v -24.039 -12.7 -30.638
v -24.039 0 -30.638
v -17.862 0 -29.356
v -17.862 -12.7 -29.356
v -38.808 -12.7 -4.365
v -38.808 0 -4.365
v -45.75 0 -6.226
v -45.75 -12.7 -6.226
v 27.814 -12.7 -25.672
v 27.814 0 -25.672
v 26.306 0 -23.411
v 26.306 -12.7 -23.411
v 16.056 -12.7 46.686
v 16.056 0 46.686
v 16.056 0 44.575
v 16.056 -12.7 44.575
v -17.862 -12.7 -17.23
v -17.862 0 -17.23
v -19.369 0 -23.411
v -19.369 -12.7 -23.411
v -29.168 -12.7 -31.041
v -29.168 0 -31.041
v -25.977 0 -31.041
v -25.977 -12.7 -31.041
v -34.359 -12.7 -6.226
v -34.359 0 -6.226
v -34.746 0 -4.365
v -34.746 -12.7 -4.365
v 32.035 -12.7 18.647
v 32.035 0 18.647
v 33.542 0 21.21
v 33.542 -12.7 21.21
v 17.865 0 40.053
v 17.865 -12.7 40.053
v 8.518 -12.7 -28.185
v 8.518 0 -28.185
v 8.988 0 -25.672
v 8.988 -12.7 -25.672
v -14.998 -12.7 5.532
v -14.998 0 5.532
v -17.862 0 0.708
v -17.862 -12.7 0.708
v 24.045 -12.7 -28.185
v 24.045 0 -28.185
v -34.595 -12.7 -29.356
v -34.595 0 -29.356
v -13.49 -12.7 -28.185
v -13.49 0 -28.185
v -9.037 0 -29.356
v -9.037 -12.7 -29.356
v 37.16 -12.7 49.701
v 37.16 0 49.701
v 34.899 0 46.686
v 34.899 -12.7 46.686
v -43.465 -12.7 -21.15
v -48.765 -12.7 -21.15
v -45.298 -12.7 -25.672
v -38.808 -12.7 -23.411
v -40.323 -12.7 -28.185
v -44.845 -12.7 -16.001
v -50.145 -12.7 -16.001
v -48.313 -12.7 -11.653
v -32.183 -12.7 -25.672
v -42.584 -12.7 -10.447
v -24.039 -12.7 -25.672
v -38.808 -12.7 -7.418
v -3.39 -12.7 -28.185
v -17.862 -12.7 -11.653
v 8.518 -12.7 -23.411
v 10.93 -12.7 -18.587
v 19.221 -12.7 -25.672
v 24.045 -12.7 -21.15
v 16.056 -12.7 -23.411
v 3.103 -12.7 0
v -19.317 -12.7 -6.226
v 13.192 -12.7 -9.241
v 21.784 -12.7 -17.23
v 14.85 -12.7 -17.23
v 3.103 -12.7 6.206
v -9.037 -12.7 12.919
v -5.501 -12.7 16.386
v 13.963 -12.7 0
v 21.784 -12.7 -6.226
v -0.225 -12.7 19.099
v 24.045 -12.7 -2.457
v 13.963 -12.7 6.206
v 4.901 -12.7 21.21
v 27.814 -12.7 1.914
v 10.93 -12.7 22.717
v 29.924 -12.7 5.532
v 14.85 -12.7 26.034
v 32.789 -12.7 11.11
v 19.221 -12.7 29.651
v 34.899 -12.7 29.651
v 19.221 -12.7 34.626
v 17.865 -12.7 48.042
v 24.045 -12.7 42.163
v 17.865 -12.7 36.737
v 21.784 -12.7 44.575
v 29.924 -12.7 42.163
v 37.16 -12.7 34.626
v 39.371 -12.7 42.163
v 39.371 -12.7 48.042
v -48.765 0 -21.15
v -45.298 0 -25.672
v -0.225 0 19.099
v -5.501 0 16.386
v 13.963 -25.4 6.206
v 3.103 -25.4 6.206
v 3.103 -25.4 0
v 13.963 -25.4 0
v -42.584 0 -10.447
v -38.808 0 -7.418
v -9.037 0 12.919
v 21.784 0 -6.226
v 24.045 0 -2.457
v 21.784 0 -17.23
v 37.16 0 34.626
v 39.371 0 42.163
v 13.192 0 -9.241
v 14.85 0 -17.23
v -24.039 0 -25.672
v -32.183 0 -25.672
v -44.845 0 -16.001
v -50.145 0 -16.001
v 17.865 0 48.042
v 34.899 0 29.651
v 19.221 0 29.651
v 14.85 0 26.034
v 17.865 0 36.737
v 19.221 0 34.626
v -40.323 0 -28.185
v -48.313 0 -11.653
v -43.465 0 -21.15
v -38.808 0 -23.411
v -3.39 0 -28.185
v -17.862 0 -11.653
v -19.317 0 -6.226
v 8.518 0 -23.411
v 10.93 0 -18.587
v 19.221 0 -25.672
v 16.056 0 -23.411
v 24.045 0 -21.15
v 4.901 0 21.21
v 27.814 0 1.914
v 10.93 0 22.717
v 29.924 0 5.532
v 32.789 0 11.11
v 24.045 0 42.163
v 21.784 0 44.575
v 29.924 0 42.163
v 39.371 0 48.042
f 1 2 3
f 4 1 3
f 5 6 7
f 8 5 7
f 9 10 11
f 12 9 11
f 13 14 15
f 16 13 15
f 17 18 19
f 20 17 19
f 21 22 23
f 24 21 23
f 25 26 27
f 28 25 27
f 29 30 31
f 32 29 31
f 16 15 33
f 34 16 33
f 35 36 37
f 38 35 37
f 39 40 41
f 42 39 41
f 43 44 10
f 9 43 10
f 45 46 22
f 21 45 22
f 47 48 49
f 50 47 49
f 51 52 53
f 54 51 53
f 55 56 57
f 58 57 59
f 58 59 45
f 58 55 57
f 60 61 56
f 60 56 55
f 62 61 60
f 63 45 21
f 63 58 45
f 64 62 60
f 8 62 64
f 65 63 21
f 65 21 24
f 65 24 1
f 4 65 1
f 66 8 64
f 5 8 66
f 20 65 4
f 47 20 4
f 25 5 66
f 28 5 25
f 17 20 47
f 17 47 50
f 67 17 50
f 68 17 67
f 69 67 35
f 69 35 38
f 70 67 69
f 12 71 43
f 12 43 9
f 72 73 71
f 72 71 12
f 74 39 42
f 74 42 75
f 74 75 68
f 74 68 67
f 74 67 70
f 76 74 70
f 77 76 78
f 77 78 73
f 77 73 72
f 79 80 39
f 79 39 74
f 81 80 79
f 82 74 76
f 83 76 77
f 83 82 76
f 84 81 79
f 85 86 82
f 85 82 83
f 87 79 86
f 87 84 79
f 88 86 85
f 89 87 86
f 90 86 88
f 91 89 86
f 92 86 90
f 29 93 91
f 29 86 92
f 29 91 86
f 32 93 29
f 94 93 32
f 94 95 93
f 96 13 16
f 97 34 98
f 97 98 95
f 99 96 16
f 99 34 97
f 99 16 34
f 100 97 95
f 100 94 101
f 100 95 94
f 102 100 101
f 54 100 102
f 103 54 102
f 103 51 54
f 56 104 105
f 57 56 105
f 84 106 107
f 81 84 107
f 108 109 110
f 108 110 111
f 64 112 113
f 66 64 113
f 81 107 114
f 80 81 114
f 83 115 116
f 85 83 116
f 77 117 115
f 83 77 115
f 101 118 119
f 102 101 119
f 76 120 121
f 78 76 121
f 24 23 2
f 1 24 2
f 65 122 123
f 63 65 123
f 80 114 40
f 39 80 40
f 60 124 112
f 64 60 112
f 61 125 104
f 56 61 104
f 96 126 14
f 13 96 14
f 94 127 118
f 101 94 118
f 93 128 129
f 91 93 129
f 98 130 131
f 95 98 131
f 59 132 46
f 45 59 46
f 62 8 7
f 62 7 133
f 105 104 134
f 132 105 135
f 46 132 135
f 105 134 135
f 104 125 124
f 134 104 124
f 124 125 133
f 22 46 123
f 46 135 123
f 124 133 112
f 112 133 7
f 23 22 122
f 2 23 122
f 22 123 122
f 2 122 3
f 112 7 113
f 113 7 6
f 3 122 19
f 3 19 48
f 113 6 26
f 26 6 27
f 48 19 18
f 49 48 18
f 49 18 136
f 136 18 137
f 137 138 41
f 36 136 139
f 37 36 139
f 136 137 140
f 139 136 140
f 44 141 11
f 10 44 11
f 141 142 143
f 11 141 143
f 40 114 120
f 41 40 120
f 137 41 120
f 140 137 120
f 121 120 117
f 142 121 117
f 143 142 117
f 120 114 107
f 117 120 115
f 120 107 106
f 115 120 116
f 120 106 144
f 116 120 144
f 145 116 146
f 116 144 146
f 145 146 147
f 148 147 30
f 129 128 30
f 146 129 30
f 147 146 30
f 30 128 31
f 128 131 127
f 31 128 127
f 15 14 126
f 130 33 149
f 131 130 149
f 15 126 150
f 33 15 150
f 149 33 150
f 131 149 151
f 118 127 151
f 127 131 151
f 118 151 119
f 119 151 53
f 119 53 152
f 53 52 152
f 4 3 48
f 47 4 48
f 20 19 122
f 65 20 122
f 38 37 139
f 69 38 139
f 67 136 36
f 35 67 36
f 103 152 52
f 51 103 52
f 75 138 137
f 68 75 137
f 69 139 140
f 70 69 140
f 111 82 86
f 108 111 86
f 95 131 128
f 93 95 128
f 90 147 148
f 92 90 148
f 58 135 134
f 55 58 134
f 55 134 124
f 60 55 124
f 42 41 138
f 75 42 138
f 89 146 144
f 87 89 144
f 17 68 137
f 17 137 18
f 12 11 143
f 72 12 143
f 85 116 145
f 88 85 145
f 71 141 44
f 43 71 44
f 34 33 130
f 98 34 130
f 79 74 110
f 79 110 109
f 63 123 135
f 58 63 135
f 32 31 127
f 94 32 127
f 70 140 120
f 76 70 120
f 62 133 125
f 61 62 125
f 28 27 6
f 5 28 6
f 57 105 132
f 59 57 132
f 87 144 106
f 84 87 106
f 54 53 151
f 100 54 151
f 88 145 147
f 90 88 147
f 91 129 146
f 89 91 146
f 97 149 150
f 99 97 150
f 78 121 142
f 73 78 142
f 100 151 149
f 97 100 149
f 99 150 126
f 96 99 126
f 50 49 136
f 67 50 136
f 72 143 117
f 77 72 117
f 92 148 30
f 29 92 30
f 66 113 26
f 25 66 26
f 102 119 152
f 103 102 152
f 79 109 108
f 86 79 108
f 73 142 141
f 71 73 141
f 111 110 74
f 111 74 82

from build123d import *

# Parameters (mm, degrees)
F1_DEPTH = 12.7
F2_W     = 10.860083
F2_H     = 6.205762
F3_DEPTH = 12.7


with BuildPart() as f1:
    # F0 (on Front) → F1 (new body)
    with BuildSketch(Plane.XZ):
        Polygon((10.930421, 22.717176), (4.900595, 21.209723), (-0.224752, 19.099282), (-5.500847, 16.385859), (-9.036702, 12.918709), (-14.997827, 5.532174), (-17.861986, 0.708314), (-19.316724, -6.225982), (-17.861986, -11.652825), (-17.861986, -17.230413), (-19.369447, -23.410983), (-24.038606, -25.672167), (-32.182822, -25.672167), (-38.807783, -23.410983), (-43.465309, -21.149799), (-44.845456, -16.001211), (-42.584272, -10.446859), (-38.807783, -7.418466), (-34.359269, -6.225982), (-34.745501, -4.365046), (-38.807783, -4.365046), (-45.749934, -6.225982), (-48.312606, -11.652825), (-50.144989, -16.001211), (-48.764841, -21.149799), (-45.297699, -25.672167), (-40.323088, -28.184597), (-34.594753, -29.356468), (-29.167914, -31.04079), (-25.977362, -31.04079), (-24.038606, -30.638407), (-17.861986, -29.356468), (-13.490366, -28.184597), (-9.036702, -29.356468), (-3.390411, -28.184597), (1.584193, -28.184597), (8.518493, -28.184597), (8.987795, -25.672167), (8.518493, -23.410983), (10.930421, -18.587123), (13.191605, -9.240893), (14.849806, -17.230413), (16.055772, -23.410983), (19.221431, -25.672167), (24.045291, -28.184597), (27.813932, -25.672167), (26.306475, -23.410983), (24.045291, -21.149799), (21.784107, -17.230413), (21.784107, -12.105062), (21.784107, -6.225982), (24.045291, -2.457341), (27.813932, 1.91428), (29.924371, 5.532174), (32.788538, 11.109764), (32.034809, 18.647043), (33.542265, 21.209723), (34.898975, 29.651476), (37.16016, 34.62608), (39.371106, 42.163363), (39.371106, 48.042437), (37.16016, 49.700646), (34.898975, 46.685731), (29.924371, 42.163363), (27.813932, 42.163363), (24.045291, 42.163363), (21.784107, 44.575287), (17.864721, 48.042437), (16.055772, 46.685731), (16.055772, 44.575287), (17.864721, 40.052927), (17.864721, 36.736517), (19.221431, 34.62608), (19.221431, 29.651476), (14.849806, 26.033579), align=None)
    extrude(amount=F1_DEPTH)

    # F2 (on face) → F3 (join)
    with BuildSketch(Plane.XZ.offset(12.7)):
        with Locations((8.532922, 3.102881)):
            Rectangle(F2_W, F2_H)
    extrude(amount=F3_DEPTH)


solid = f1.part
